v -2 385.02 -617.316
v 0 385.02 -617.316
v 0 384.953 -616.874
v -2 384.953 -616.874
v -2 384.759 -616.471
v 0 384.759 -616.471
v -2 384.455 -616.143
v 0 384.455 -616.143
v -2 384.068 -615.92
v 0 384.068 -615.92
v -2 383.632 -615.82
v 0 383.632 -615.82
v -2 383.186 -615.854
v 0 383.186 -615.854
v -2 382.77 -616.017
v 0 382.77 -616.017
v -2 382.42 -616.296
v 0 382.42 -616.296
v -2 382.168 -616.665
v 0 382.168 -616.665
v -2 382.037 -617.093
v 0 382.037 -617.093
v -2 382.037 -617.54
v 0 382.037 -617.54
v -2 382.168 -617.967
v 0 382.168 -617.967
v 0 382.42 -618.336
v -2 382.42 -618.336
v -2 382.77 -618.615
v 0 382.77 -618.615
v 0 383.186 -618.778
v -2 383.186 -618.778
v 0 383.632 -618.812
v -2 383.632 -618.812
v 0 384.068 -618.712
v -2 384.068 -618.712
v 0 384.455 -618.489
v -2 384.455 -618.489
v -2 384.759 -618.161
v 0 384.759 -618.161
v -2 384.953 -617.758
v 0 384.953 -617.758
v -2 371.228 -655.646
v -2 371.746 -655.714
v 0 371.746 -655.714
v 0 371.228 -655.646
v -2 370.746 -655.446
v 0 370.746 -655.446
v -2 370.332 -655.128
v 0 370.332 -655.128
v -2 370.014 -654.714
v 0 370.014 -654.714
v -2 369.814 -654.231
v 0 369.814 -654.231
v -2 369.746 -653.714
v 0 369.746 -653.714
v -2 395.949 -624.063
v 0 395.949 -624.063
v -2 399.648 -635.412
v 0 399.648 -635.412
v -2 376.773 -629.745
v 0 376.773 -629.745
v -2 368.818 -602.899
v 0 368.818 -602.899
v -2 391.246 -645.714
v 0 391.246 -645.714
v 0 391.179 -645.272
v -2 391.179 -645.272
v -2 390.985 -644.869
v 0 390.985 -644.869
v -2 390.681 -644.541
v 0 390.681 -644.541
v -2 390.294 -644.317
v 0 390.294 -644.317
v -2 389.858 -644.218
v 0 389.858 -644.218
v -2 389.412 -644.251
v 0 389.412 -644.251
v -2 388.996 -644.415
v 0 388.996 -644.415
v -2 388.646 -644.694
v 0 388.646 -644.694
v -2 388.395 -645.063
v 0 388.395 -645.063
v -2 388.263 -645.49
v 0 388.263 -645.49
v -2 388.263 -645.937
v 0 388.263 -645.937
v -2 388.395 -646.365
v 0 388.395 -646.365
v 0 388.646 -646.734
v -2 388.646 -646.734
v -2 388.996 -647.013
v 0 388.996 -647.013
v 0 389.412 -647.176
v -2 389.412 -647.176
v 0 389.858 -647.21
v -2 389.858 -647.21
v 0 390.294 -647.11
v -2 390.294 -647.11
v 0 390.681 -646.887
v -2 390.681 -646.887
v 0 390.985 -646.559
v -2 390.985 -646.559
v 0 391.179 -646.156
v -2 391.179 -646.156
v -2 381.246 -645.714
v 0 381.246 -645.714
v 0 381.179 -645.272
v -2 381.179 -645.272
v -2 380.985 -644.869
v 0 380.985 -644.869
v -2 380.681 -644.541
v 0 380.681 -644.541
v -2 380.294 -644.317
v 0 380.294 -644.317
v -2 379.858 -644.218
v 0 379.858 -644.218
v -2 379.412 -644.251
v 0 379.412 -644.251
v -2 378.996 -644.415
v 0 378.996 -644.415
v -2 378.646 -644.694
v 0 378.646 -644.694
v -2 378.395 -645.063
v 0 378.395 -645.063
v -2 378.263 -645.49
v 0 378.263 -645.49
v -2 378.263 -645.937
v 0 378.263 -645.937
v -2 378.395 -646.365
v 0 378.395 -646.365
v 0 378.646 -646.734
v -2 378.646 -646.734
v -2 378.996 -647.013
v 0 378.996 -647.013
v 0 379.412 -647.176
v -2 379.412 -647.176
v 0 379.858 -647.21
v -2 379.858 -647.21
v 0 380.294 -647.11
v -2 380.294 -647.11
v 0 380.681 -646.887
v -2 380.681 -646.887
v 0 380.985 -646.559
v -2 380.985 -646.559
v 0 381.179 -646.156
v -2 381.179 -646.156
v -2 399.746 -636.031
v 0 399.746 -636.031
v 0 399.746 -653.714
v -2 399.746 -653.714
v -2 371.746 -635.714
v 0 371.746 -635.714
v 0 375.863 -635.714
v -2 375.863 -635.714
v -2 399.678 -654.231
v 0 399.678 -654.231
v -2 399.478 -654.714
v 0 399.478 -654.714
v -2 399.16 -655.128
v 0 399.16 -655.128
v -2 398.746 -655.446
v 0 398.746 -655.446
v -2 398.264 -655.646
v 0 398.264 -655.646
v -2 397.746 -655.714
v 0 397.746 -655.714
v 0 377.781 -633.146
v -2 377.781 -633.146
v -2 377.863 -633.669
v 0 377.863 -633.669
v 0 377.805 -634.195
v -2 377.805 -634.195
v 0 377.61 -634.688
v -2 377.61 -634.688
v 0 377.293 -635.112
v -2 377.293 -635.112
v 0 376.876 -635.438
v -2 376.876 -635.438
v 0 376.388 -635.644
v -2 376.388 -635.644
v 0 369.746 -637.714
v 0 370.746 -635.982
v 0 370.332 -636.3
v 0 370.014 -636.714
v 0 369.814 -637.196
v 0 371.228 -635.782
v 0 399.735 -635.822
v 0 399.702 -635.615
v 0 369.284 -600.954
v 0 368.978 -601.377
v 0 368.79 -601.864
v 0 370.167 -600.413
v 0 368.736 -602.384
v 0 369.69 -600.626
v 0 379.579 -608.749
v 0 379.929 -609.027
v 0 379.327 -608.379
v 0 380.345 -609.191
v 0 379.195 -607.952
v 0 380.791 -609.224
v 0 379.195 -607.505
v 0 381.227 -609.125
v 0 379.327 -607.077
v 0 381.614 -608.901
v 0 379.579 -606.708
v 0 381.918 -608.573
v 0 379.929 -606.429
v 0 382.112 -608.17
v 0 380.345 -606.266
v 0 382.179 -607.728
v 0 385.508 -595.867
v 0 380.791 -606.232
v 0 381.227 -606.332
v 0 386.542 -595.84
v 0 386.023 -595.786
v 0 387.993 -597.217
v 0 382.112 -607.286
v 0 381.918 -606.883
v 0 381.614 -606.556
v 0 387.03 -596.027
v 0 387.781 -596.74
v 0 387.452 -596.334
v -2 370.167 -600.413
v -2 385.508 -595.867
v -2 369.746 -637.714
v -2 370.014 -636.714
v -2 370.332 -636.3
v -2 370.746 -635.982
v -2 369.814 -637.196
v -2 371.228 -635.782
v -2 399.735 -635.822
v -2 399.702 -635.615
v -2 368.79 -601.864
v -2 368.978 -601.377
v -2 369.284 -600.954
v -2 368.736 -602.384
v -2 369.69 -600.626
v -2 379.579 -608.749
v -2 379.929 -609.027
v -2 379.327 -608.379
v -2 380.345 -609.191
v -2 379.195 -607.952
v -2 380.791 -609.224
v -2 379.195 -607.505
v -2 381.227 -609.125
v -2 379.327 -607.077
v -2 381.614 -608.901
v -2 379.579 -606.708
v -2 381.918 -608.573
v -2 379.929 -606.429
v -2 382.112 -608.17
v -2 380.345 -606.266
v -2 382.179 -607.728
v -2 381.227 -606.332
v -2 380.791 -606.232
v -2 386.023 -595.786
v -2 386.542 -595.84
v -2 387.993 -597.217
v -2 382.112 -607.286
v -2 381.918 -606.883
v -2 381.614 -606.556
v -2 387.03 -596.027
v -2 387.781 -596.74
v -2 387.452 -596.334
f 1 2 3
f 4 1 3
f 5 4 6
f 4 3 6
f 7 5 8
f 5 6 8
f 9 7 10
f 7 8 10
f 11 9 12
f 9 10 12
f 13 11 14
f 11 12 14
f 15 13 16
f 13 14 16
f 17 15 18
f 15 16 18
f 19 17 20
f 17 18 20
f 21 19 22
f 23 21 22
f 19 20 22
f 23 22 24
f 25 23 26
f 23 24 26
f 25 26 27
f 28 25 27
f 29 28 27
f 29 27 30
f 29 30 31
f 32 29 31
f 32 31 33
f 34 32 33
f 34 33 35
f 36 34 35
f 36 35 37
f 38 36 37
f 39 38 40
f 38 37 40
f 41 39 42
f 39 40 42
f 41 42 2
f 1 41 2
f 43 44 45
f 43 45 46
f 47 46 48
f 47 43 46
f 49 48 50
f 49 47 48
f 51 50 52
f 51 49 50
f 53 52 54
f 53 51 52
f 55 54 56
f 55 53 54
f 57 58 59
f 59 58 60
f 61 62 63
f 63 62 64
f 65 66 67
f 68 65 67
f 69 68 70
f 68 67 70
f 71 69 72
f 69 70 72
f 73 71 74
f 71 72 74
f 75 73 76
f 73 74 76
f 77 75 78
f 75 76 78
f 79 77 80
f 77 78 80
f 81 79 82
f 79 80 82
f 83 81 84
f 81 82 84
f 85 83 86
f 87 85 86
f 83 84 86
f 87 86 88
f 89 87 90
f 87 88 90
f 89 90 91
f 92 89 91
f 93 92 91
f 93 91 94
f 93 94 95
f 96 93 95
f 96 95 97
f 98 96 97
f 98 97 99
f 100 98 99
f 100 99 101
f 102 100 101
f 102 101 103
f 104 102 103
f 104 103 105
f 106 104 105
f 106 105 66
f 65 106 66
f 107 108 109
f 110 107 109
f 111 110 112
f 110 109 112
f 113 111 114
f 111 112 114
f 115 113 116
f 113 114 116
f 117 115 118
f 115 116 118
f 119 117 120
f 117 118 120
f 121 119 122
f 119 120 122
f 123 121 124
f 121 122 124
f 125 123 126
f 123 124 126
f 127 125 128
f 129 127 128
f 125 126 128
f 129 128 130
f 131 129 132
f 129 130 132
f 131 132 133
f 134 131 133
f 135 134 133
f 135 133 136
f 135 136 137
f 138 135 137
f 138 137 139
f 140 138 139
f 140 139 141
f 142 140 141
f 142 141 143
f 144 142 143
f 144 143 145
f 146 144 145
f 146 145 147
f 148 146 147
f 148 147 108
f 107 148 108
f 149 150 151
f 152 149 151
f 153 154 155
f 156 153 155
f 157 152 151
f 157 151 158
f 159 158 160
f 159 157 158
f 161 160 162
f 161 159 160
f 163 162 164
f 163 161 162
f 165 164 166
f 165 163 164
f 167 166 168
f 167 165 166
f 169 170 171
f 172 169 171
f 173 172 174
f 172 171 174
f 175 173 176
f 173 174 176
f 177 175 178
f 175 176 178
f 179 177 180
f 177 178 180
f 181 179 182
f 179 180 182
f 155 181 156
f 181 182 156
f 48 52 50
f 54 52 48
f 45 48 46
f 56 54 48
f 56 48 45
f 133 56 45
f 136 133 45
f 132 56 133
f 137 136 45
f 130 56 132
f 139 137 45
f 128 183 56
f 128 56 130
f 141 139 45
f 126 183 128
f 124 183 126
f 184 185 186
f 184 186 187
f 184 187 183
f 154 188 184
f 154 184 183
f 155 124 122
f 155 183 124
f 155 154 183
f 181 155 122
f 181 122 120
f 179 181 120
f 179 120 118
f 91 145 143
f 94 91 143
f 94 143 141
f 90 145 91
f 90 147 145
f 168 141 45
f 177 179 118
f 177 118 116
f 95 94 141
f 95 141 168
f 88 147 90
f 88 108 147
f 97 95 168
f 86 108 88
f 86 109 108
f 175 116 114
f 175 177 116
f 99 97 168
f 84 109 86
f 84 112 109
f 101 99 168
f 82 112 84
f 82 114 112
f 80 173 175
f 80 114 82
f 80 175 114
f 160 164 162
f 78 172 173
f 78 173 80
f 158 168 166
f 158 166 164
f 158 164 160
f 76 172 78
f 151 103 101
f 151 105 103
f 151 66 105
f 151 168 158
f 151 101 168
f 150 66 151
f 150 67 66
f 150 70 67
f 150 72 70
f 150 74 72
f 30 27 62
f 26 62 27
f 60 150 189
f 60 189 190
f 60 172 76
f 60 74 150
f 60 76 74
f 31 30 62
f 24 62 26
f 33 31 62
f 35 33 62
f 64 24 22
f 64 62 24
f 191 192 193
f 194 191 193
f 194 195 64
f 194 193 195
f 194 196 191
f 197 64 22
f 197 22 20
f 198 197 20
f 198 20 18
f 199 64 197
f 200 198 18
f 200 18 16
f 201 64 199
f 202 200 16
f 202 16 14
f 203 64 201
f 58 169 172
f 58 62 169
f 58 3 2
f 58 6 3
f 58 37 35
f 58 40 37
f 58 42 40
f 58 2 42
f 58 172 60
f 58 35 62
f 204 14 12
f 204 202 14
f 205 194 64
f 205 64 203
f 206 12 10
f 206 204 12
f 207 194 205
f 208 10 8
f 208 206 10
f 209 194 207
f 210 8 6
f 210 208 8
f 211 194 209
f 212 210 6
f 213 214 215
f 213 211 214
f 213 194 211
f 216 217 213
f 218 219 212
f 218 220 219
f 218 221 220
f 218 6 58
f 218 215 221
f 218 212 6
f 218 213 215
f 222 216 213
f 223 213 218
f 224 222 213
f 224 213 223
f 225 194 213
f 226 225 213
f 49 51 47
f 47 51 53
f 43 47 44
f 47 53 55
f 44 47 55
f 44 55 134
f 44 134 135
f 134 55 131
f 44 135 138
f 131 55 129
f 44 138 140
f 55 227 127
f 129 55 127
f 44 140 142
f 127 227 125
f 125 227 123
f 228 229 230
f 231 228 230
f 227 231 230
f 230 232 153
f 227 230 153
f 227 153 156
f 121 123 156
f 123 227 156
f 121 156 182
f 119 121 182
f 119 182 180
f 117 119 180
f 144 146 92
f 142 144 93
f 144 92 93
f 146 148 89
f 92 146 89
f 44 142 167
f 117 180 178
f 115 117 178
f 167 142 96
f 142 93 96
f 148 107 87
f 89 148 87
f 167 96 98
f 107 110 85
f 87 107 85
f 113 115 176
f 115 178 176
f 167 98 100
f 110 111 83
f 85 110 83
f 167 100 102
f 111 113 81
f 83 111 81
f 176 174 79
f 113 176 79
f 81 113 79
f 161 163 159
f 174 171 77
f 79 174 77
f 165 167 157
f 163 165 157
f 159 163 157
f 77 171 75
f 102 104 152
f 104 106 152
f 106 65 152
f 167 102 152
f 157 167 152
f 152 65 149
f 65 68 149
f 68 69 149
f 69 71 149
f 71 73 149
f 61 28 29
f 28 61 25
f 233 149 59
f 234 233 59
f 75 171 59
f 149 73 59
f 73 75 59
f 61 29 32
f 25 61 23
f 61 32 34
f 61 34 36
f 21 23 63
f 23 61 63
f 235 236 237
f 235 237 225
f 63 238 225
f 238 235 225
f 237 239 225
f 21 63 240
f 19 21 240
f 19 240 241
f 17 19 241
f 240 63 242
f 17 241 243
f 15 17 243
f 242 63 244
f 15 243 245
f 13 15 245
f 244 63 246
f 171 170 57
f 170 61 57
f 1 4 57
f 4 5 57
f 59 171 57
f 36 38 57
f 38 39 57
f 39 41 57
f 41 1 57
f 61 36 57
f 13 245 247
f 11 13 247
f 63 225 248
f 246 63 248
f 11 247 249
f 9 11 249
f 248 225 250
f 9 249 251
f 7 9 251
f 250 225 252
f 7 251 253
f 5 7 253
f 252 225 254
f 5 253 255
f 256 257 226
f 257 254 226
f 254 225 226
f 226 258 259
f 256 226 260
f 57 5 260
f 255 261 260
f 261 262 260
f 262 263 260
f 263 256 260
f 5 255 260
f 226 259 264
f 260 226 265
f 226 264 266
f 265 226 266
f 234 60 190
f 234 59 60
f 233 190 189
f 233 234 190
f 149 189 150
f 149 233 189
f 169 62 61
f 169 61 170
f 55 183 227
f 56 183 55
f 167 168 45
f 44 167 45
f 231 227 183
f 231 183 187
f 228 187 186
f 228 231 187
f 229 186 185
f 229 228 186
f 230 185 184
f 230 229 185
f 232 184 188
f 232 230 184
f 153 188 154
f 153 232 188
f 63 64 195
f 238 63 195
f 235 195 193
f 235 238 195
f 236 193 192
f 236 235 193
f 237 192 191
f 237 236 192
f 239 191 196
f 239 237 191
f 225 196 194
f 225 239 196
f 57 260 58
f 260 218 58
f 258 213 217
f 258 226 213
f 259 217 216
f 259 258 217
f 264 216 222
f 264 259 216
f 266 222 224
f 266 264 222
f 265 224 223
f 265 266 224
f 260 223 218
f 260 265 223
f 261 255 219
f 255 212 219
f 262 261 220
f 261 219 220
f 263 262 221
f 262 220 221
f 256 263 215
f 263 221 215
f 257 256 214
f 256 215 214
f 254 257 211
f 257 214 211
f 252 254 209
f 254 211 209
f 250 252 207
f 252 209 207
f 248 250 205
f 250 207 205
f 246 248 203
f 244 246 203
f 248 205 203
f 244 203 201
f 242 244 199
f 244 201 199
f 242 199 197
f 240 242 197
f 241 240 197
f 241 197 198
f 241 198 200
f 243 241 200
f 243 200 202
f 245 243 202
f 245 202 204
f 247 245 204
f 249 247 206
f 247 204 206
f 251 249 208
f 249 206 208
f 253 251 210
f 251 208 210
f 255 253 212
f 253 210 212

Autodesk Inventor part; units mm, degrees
ref_plane "YZ Plane" through (0, 0, 0) normal (1, 0, 0) x (0, 1, 0)
ref_plane "XZ Plane" through (0, 0, 0) normal (0, 1, 0) x (-1, 0, 0)
ref_plane "XY Plane" through (0, 0, 0) normal (0, 0, 1) x (1, 0, 0)
sketch "スケッチ1" plane through (0, 0, 0) normal (1, 0, 0) x (0, 1, 0)
  line L0 (-64.254, -635.7138) -> (-64.254, 672.2862)
  line L1 (-64.254, -533.7138) -> (340.746, -533.7138)
  line L2 (340.746, -533.7138) -> (340.746, -513.7138)
  line L3 (340.746, -513.7138) -> (-64.254, -513.7138)
  line L4 (-64.254, -513.7138) -> (-64.254, -533.7138)
  circle A0 centre (-29.074, -486.7138) radius 21
  circle A1 centre (-29.074, -444.7138) radius 16
  circle A2 centre (-29.074, -444.7138) radius 13.68
  line L5 (-84.254, -635.7138) -> (-64.254, -635.7138)
  line L6 (-84.254, -635.7138) -> (-64.254, -635.7138)
  line L7 (-84.254, -635.7138) -> (399.746, -635.7138)
  line L8 (399.746, -635.7138) -> (399.746, -655.7138)
  line L9 (399.746, -655.7138) -> (-84.254, -655.7138)
  line L10 (-84.254, -655.7138) -> (-84.254, -635.7138)
  line L11 (-9.074, 672.2862) -> (10.1017, 677.9687)
  line L12 (10.1017, 677.9687) -> (395.949, -624.0627)
  line L13 (395.949, -624.0627) -> (376.7733, -629.7453)
  line L14 (376.7733, -629.7453) -> (-9.074, 672.2862)
  line L15 (-84.254, 672.2862) -> (-84.254, -635.7138)
  line L16 (-84.254, -428.7138) -> (-29.074, -428.7138)
  line L17 (-8.074, -486.7138) -> (-8.074, -533.7138)
  line L18 (-8.074, -486.7138) -> (-8.074, -428.7138)
  line L19 (-8.074, -428.7138) -> (-29.074, -428.7138)
  circle A3 centre (-74.254, -440.7138) radius 1.5
  circle A4 centre (-74.254, -450.7138) radius 1.5
  line L20 (-29.074, -460.7138) -> (-84.254, -460.7138)
  circle A5 centre (-54.254, -523.7138) radius 1.5
  circle A6 centre (-34.254, -523.7138) radius 1.5
  line L21 (-64.254, -533.7138) -> (-84.254, -533.7138)
  circle A7 centre (-74.254, -523.7138) radius 1.5
  circle A8 centre (-74.254, -503.7138) radius 1.5
  circle A9 centre (-29.074, 656.2862) radius 16
  line L22 (-64.254, 672.2862) -> (-84.254, 672.2862)
  line L23 (-84.254, 672.2862) -> (-29.074, 672.2862)
  line L24 (-29.074, 640.2862) -> (-84.254, 640.2862)
  line L25 (-29.074, 672.2862) -> (-9.074, 672.2862)
  circle A10 centre (-29.074, 656.2862) radius 7.5
  line L26 (-29.074, 640.2862) -> (0.4089, 640.2862)
  circle A11 centre (-74.254, 660.2862) radius 1.5
  circle A12 centre (-74.254, 650.2862) radius 1.5
  circle A13 centre (3.3551, 665.5396) radius 1.5
  circle A14 centre (6.1964, 655.9517) radius 1.5
  line L27 (0.4089, 640.2862) -> (19.5847, 645.9687)
  line L28 (-64.254, -595.7138) -> (-44.254, -635.7138)
  line L29 (-44.254, -635.7138) -> (-44.254, -655.7138)
  line L30 (-64.254, -595.7138) -> (-84.254, -595.7138)
  circle A15 centre (-74.254, -625.7138) radius 1.5
  circle A16 centre (-74.254, -615.7138) radius 1.5
  circle A17 centre (-74.254, -605.7138) radius 1.5
  circle A18 centre (-74.254, -645.7138) radius 1.5
  circle A19 centre (-64.254, -645.7138) radius 1.5
  circle A20 centre (-54.254, -645.7138) radius 1.5
  line L31 (-84.254, -635.7138) -> (-84.254, -595.7138)
  line L32 (369.746, -635.7138) -> (369.746, -655.7138)
  line L33 (368.2494, -600.9817) -> (387.4252, -595.2991)
  line L34 (376.7733, -629.7453) -> (378.5421, -635.7138)
  line L35 (395.949, -624.0627) -> (399.746, -635.7138)
  circle A21 centre (379.746, -645.7138) radius 1.5
  circle A22 centre (389.746, -645.7138) radius 1.5
  circle A23 centre (383.5199, -617.3161) radius 1.5
  circle A24 centre (380.6786, -607.7283) radius 1.5
  circle A25 centre (320.746, -523.7138) radius 1.5
  circle A26 centre (330.746, -523.7138) radius 1.5
  line L36 (340.746, -513.7138) -> (342.3883, -513.7138)
  line L37 (340.746, -533.7138) -> (348.3151, -533.7138)
  line L38 (342.3883, -513.7138) -> (363.248, -513.7138)
  circle A27 centre (355.6752, -523.3551) radius 1.5
  circle A28 centre (358.5165, -532.9429) radius 1.5
  line L39 (351.7699, -545.3721) -> (370.9457, -539.6895)
  line L40 (310.746, -513.7138) -> (310.746, -533.7138)
  line L41 (368.2494, -600.9817) -> (369.746, -635.7138)
  point P0 (0, 0)
  point P1 (-387.254, -203.3804)
  point P2 (-64.254, -513.7138)
  point P3 (386.3612, -626.904)
  dimension "d1" = 42
  dimension "d0" = 20
  dimension "d2" = 32
  dimension "d3" = 27.36
  dimension "d4" = 35.18
  dimension "d5" = 35.18
  dimension "d6" = 27
  dimension "d7" = 42
  dimension "d8" = 191
  dimension "d9" = 20
  dimension "d10" = 484
  dimension "d11" = 3
  dimension "d12" = 3
  dimension "d13" = 10
  dimension "d14" = 10
  dimension "d15" = 10
  dimension "d16" = 10
  dimension "d17" = 3
  dimension "d18" = 3
  dimension "d19" = 10
  dimension "d20" = 20
  dimension "d21" = 10
  dimension "d22" = 10
  dimension "d23" = 3
  dimension "d24" = 3
  dimension "d25" = 10
  dimension "d26" = 20
  dimension "d27" = 10
  dimension "d28" = 10
  dimension "d29" = 20
  dimension "d30" = 32
  dimension "d31" = 35.18
  dimension "d32" = 20
  dimension "d33" = 1358
  dimension "d34" = 91.543
  dimension "d35" = 405
  dimension "d36" = 15
  dimension "d37" = 3
  dimension "d38" = 3
  dimension "d39" = 10
  dimension "d40" = 10
  dimension "d41" = 10
  dimension "d42" = 10
  dimension "d43" = 3
  dimension "d44" = 3
  dimension "d45" = 10
  dimension "d46" = 10
  dimension "d47" = 10
  dimension "d48" = 10
  dimension "d49" = 40
  dimension "d50" = 3
  dimension "d51" = 3
  dimension "d52" = 3
  dimension "d53" = 3
  dimension "d54" = 3
  dimension "d55" = 3
  dimension "d56" = 10
  dimension "d57" = 10
  dimension "d58" = 10
  dimension "d59" = 10
  dimension "d60" = 10
  dimension "d61" = 10
  dimension "d62" = 10
  dimension "d63" = 10
  dimension "d64" = 10
extrude "押し出し1" add sketch "スケッチ1" against normal blind 2 contours L7 L8 L9 L32 | L34 L13 L35 L7 | L33 L12 L13 L14
fillet "フィレット1" radius 2 7 edges at (-1, 368.2494, -600.9817) (-1, 378.5421, -635.7138) (-1, 369.746, -635.7138) (-1, 369.746, -655.7138) (-1, 399.746, -655.7138) (-1, 399.746, -635.7138) (-1, 387.4252, -595.2991)
equation "\"d5\" = d4"
equation "\"d14\" = d15"
equation "\"d21\" = d19"
equation "\"d22\" = d19"
equation "\"d27\" = d25"
equation "\"d28\" = d25"
equation "\"d31\" = d4"
equation "\"d41\" = d39"
equation "\"d42\" = d39"
equation "\"d46\" = d45"
equation "\"d47\" = d45"
equation "\"d48\" = d45"
equation "\"d57\" = d56"
equation "\"d58\" = d56"
equation "\"d59\" = d56"
equation "\"d60\" = d56"
equation "\"d61\" = d56"
equation "\"d62\" = d56"
equation "\"d63\" = d56"
equation "\"d64\" = d62"
properties part number "dribl-v1-Plate-10" material "アルミニウム 6061"
